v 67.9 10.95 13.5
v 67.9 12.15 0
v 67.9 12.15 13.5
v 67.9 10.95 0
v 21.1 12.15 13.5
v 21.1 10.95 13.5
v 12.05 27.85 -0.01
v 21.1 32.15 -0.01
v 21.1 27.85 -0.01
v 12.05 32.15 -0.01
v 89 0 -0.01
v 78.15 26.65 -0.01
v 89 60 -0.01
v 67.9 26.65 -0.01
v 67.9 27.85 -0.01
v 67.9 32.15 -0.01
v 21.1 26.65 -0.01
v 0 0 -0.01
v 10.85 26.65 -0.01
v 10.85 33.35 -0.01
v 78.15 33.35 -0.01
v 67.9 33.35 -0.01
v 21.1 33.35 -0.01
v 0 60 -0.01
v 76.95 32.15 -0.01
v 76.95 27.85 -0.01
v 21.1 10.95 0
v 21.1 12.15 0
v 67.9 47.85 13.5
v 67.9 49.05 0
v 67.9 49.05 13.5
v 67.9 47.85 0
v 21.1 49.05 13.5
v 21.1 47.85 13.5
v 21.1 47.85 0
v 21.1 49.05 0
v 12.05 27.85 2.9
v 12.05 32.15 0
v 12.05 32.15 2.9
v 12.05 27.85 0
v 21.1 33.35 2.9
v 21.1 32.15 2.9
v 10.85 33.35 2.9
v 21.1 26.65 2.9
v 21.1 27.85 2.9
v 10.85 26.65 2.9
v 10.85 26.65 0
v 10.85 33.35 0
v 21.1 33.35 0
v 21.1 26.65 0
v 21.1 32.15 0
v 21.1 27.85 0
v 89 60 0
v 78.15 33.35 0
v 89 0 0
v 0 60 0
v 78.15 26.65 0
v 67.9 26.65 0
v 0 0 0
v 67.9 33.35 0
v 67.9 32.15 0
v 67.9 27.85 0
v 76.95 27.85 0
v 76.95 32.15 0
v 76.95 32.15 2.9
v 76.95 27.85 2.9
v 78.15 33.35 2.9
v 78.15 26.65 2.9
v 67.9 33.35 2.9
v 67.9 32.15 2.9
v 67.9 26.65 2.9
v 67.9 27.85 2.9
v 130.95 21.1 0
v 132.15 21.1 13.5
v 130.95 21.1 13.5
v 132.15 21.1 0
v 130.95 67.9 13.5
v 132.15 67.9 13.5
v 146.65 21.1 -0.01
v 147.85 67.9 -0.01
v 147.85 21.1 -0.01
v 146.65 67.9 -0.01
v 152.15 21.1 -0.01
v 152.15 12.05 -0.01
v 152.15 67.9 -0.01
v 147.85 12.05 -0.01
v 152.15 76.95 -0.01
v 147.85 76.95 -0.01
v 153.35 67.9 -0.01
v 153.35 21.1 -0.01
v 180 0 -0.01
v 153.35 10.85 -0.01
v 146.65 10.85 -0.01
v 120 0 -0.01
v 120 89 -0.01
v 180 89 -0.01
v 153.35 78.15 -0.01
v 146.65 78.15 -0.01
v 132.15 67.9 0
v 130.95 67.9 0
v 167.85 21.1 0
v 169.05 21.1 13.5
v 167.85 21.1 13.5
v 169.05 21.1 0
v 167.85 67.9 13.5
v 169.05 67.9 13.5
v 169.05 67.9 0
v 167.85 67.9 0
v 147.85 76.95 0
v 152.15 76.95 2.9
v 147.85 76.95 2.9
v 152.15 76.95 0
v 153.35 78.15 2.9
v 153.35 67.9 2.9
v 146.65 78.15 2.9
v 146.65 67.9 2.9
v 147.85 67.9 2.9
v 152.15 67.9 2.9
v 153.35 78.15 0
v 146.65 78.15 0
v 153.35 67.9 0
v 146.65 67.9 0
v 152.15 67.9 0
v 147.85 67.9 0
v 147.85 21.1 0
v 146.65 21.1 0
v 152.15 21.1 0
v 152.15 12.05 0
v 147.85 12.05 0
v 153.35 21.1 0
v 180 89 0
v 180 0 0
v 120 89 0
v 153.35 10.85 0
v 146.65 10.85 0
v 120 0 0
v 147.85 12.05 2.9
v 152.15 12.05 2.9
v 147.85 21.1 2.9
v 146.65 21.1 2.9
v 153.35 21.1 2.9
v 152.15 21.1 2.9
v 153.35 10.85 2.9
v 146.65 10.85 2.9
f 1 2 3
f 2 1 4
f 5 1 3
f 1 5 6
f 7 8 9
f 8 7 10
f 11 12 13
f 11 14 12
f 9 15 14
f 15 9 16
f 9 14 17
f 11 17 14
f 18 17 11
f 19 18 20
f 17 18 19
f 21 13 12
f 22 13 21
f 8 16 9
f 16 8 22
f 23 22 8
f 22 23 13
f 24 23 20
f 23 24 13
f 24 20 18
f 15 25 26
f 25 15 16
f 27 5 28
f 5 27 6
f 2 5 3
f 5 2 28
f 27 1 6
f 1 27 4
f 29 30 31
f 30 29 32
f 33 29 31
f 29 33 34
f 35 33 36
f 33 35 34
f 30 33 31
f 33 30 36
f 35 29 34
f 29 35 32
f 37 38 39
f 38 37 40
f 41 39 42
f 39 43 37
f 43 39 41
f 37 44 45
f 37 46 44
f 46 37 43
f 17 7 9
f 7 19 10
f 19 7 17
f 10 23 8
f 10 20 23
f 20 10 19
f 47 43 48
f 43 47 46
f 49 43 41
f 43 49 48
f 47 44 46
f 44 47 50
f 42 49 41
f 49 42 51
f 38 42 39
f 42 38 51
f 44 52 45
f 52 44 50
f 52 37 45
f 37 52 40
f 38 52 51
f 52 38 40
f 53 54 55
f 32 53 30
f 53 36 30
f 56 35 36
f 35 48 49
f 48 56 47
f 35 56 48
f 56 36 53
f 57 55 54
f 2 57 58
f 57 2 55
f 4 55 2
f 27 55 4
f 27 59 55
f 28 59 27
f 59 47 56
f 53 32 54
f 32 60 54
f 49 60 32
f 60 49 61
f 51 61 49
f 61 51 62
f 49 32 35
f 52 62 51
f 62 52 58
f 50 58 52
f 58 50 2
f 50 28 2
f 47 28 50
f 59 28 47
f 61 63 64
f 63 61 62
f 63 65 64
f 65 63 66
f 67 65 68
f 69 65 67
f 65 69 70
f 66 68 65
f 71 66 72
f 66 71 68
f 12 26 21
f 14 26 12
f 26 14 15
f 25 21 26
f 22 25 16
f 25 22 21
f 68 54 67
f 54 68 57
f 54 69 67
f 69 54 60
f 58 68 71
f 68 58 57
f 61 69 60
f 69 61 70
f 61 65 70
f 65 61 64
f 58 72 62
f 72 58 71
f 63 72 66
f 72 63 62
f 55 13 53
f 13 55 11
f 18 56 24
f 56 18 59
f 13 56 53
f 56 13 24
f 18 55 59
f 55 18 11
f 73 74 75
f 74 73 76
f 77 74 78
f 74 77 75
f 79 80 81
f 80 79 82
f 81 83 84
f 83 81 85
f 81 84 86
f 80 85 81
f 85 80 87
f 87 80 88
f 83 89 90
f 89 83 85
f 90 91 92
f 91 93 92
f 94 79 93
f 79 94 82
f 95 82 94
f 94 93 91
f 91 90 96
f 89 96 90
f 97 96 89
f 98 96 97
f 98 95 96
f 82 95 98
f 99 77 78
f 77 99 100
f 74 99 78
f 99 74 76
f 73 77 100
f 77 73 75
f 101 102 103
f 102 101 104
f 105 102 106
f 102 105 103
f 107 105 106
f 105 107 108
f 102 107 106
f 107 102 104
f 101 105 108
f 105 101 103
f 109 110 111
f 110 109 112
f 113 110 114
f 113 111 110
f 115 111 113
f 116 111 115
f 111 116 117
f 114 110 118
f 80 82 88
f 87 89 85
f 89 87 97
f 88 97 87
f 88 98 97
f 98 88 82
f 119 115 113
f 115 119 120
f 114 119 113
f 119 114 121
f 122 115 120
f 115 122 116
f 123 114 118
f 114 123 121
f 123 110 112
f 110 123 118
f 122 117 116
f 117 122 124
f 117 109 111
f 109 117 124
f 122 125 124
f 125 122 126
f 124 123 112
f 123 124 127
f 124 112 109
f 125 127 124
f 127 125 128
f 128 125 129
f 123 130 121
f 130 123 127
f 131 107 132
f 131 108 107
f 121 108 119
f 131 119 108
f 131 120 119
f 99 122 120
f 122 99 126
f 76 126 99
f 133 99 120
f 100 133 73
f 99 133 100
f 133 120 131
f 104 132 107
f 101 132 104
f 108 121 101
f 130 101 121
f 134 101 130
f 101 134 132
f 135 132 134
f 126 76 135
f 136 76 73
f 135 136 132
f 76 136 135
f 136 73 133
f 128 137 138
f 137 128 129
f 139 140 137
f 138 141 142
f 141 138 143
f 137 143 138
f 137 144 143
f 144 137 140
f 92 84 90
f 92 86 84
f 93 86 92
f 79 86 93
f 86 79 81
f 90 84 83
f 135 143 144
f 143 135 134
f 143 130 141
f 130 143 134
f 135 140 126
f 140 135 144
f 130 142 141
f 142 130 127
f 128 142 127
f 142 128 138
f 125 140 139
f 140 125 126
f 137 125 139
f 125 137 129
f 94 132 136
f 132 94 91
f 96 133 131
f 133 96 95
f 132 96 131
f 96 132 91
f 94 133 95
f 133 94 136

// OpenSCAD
// file: ../../Base/Boxes.scad
// Fischertechnik Box Foundation
// Pre-designed Boxes

use <Constants.scad>

include <PlacementOptions.scad>

box190Width = 190;
box190Depth = 130;
box130Width = 130;
box130Depth = 95;
boxUsageHeight = 33.9;
boxWallThickness = 2.4;
boxBaseThickness = 1.0;

// getBoxWallThickness()
// Gets the wall thickness of a Fischertechnik Box

function getBoxWallThickness() = boxWallThickness;

// Gets the usable height of a fischertechnik box
function getBoxUsageHeight() = boxUsageHeight;

// Gets the thickness of the Fischertechnik box base.
function getBoxBaseThickness() = boxBaseThickness;

// Gets the usable inner space of a Box 190 as an x/y-list
function getBox190Space() = [
    box190Width - 2*getBoxWallThickness(), 
    box190Depth - 2*getBoxWallThickness() ];

// Imports the Fischertechnik empty box 130x190 mm and places it at position 0,0
// 190x130 are the outer sizes, the inner space is slightly smaller. Use getBox190Space() to get the inner sizes.
// This module needs the STL file "Fischertechnik Box 130x190.stl" in the library path.
// The box is positioned that the usable inner space is at the 0,0,0 position. The

module Box190() {
    translate([-getBoxWallThickness(),-getBoxWallThickness(),-getBoxBaseThickness()])
        import("Fischertechnik Box 130x190.stl", convexity=3);
}

// Gets the usable inner space of a Box 130 as an x/y-list
function getBox130Space() = [
    box130Width - 2*getBoxWallThickness(), 
    box130Depth - 2*getBoxWallThickness() ];

// Imports the Fischertechnik empty box 95x130 mm and places it at position 0,0
// 190x130 are the outer sizes, the inner space is slightly smaller. Use getBox190Space() to get the inner sizes.
// This module needs the STL file "Fischertechnik Box 95x130.stl" in the library path.
// The box is positioned that the usable inner space is at the 0,0,0 position. The

module Box130() {
    translate([-getBoxWallThickness(),-getBoxWallThickness(),-getBoxBaseThickness()])
        import("Fischertechnik Box 95x130.stl", convexity=3);
}

// Creates a web at the specified box walls
// corner 0 = LowerLeft, 1 = UpperLeft, 2 = UpperRight, 3 = LowerRight
// side 0 = LeftOfCorner, 1 = RightOfCorner
// distance = Distance in mm from the corner
// box = inner width and depth of the box (default: Box 190)
// webWidth = length of the web (default is 3 mms)
// webThickness = thickness of the web (default is 1 mm)

module BoxWeb(corner, side, distance, box=getBox190Space(), webWidth=3, webThickness=1.0) {
    sink = getBoxWallThickness()/2;

    width = (corner % 2 == 0) ? 
            (side == LeftOfCorner ? webWidth : webThickness) :
            (side == LeftOfCorner ? webThickness : webWidth);

    depth = (corner % 2 == 0) ? 
            (side == RightOfCorner ? webWidth : webThickness) :
            (side == RightOfCorner ? webThickness : webWidth);
    
    xDiff = corner == LowerLeft ? 
                (side == LeftOfCorner ? -sink : distance) :
            (corner == UpperLeft ?                
                (side == LeftOfCorner ? distance : -sink) :
            (corner == UpperRight ?
                (side == LeftOfCorner ? box.x-webWidth+sink : box.x-distance-webThickness) :
                (side == LeftOfCorner ? box.x-distance-webThickness: box.x-webWidth+sink)));

    yDiff = corner == LowerLeft ? 
                (side == RightOfCorner ? -sink : distance) :
            (corner == UpperLeft ?
                (side == RightOfCorner ? box.y-distance : box.y-webWidth+sink) :
            (corner == UpperRight ?
                (side == RightOfCorner ? box.y-webWidth+sink : box.y-distance) :
                (side == RightOfCorner ? distance : -sink)));
    
    translate([xDiff, yDiff, -getExcess()])
        cube([width, depth, boxUsageHeight + 2*getExcess()]);
}
// file: ../../Base/Rotation.scad
// Fischertechnik Box Foundation
// Geometry Helpers Rotation

include <PlacementOptions.scad>

// getRotatedSpace(space, rotation=NoRotation)
// Rotates the space dependent on the specified rotation

function getRotatedSpace(space, rotation=NoRotation) = [
    (rotation == Rotate90 || rotation == Rotate270) ? space.y : space.x,
    (rotation == Rotate90 || rotation == Rotate270) ? space.x : space.y
];

// Rotates the given space around the fixed left lower corner
// space = the space the children needs as width/depth list [width,depth]
// rotation = 0 Rotate0 degrees, 1 Rotate90 degrees, 2 Rotate180 degrees, 3 Rotate270 degrees (equivalent to -90)

module RotateFix(space, rotation=Rotate0) {
    dy = (rotation == Rotate0 || rotation == Rotate270) ? 0 :
        (rotation == Rotate90) ? space.x :
        space.y;
    dx = (rotation < Rotate180) ? 0 :
        (rotation == Rotate180) ? space.x :
        space.y;
    
    translate([dx, dy, 0])
        rotate([0, 0, rotations[rotation]])
            children();
}
// file: ../../Base/Alignment.scad
// Fischertechnik Box Foundation
// Geometry Helpers Alignment

include <PlacementOptions.scad>

// getAlignedX(elementWidth, spaceWidth, align=AlignRight, offset=0)
// Gets the aligned X offset of an element with the given
// width in the given space.
// elementWidth = The width of the element to positon
// spaceWidth = The space where the element should be aligned
// align = 0 AlignLeft, 1 AlignCenter, 2 AlignRight
// offset = an optional offset from the aligned position. When
// aligned left or centered, then positive values are in X direction.
// When aligned right then positive values are in negative X direction.

function getAlignedX(elementWidth, spaceWidth, align=AlignRight, offset=0) =
    (align == AlignLeft) ?
        offset :
        ((align == AlignCenter) ?
        (spaceWidth - elementWidth)/2 + offset :
        spaceWidth - offset - elementWidth);

// getAlignedY(elementDepth, spaceDepth, align=AlignTop, offset=0)
// Gets the aligned Y offset of an element with the given
// depth in the given space.
// elementDepth = The depth of the element to positon
// spaceDepth = The space where the element should be aligned
// align = 0 AlignBottom, 1 AlignCenter, 2 AlignTop
// offset = an optional offset from the aligned position. When
// aligned bottom or centered, then positive values are in Y direction.
// When aligned top then positive values are in negative Y direction.

function getAlignedY(elementDepth, spaceDepth, align=AlignTop, offset=0) =
    (align == AlignBottom) ?
        offset :
        ((align == AlignCenter) ?
        (spaceDepth - elementDepth)/2 + offset :
        spaceDepth - offset - elementDepth);
// file: ../../Base/Constants.scad
// Fischertechnik Box Foundation
// Constants

// Constant values necessary for multiple elements

// Base constants
dividerThickness = 1.2;
excess = 0.01;
fragments = 90;
tolerance = 0.8;

// Gets the thickness of a divider 
function getDividerThickness() = dividerThickness;

// Gets the excess that is used to merge walls into each other
function getExcess() = excess;

// Gets amount of fragments of a cylinder
function getFragments() = fragments;

// Gets the inner tolerance of a frame to each side
function getTolerance() = tolerance;


// Fischertechnik specific constants
axisDiameter = 4;
axisBottomDiameter = axisDiameter + 1;
standardEdgeDistance = 2.5;
standardWebDistance = 11.5;
standardCornerLength = 15;
tubeWallFactor = 1.6;

// Gets axis diameter
function getAxisDiameter() = axisDiameter;

// Gets axis bottom diameter for thicker part at the bottom
function getAxisBottomDiameter() = axisBottomDiameter;

// gets the standard distance to the wall of the box for dockable frames with webs
function getStandardEdgeDistance() = standardEdgeDistance;

// gets the standard distance of each web to the corner of the dockable frame
function getStandardWebDistance() = standardWebDistance;

// gets the standard length of the corner walls of a dockable frame
function getStandardCornerLength() = standardCornerLength;

// gets the wall thickness of a tube.
function getTubeWallThickness() = tubeWallFactor * getDividerThickness();
// file: ../../Base/PlacementOptions.scad
// Fischertechnik Box Foundation
// Placement Options

// Alignment
NoAlign = 0;
AlignLeft = 1;
AlignBottom = 2;
AlignCenter = 3;
AlignRight = 4;
AlignTop = 5;

// Element rotation degree steps
rotations = [0, -90, -180, -270];

// Rotation
NoRotation = 0;
Rotate0 = 0;
Rotate90 = 1;
Rotate180 = 2;
Rotate270 = 3;

// Docking (seen from above)
NoDock = -1;
DockLeft = 0;
DockTop = 1;
DockRight = 2;
DockCorner = 2;
DockBottom = 3;

// Web corners
LowerLeft = 0;
UpperLeft = 1;
UpperRight = 2;
LowerRight = 3;

// Web position relative to corner
LeftOfCorner = 0;
RightOfCorner = 1;
// file: ../../Elements/HolderCompleteBucket.scad
// Fischertechnik Box Library
// Complete Bucket Holder
// 37354, 37353, 37355, 38257

use <../Base/Constants.scad>
use <../ModelBase/Simple.scad>
use <../ModelBase/Complex.scad>

width = 89;
depth = 60;

// getHolderCompleteBucketSpace()
// Gets the space the holder complete bucket needs as width and depth (.x and .y as a list)

function getHolderCompleteBucketSpace() = [width, depth];

// HolderCompleteBucket()
// Holder for complete bucket with three middle and two side parts, 
// and a middle axis.
// 37354, 37353, 37355, 38257

module HolderCompleteBucket() {
    railWidth = 46.8;
    railHeight = 13.5;
    railDistance = 35.7;
    outerPinFrameLength = 10.25;
    innerPinFrameLength = outerPinFrameLength - 3*getDividerThickness();
    innerPinFrameDepth = 4.3;
    outerPinFrameDepth = innerPinFrameDepth + 2*getDividerThickness();
    pinFrameHeight = 2.9;
    
    Space(getHolderCompleteBucketSpace());

    railXOffset = (getHolderCompleteBucketSpace().x - railWidth) / 2;
    railYOffset1 = (getHolderCompleteBucketSpace().y - railDistance) / 2 - getDividerThickness();
    railYOffset2 = railYOffset1 + railDistance + getDividerThickness();    
    
    translate([railXOffset, 0, 0]) {
        translate([0, railYOffset1, 0])
            Wall([railWidth, getDividerThickness(), railHeight]);
        translate([0, railYOffset2, 0])
            Wall([railWidth, getDividerThickness(), railHeight]);
    }
    
    midYOffset = (getHolderCompleteBucketSpace().y - outerPinFrameDepth) / 2;
    
    railXOffset1 = railXOffset - outerPinFrameLength;
    translate([railXOffset1, midYOffset, 0])
        DockableFrame([innerPinFrameLength, innerPinFrameDepth, pinFrameHeight], wallRight=false, tolerance=0);
    
    railXOffset2 = outerPinFrameLength + railXOffset + railWidth;
    translate([railXOffset2, midYOffset, 0])
        mirror([1,0,0])
            DockableFrame([innerPinFrameLength, innerPinFrameDepth, pinFrameHeight], wallRight=false, tolerance=0);
}

// Test
color("lightgray")
HolderCompleteBucket();
// file: ../../Base/Deployment.scad
// Fischertechnik Box Foundation
// Geometry Helpers Deployment

use <Constants.scad>
use <Placement.scad>
use <Rotation.scad>

include <PlacementOptions.scad>

// getWidth(spaces, rotations, count, i=0)
// Gets the sum of the width of count specified spaces, including rotations for each space.
// spaces = List of spaces from which the width should be added. Used internally for DeployRow.
// rotations = specify rotations for each space to get its correct width
// count = The count of spaces from the specified spaces that should be included in the sum (for recursive call)
// i = The space index offset used to start to add (for recursive call)

function getWidth(spaces, rotations, count, i=0) = 
    (i < count) ? 
        getRotatedSpace(spaces[i], rotations[i]).x + getWidth(spaces, rotations, count, i+1) : 
        0;

// getX(spaces, rotations, distance, i)
// Calculates the X position of the space with the index i, when the spaces are placed with the given
// equal distances. Used internally for DeployRow.
// spaces = List of spaces from which the width should be added
// rotations = specify rotations for each space to get its correct width
// distance = Equal distance between each space
// i = Index of the space to get its X position for

function getX(spaces, rotations, distance, i) = 
    (i == 0) ? 
        0 :
        (getRotatedSpace(spaces[i-1], rotations[i-1]).x + distance + getX(spaces, rotations, distance, i-1));

// DeployRow(width, spaces, rotations)
// Deploys the elements in the specified width with equal distances.
// rowWidth = The width of the row in mm.
// spaces = The spaces of all elements to deploy.
// rotations = The rotations of each element: 0 Rotate0 0 degrees, 1 Rotate90 90 degrees, 
// 2 Rotate180 180 degrees, 3 Rotate270 270 degrees (equivalent to -90).

module DeployRow(rowWidth, spaces, rotations) {
    distance = (rowWidth - getWidth(spaces, rotations, len(spaces))) / (len(spaces)-1);
    
    for (i = [0:1:$children-1]) {
        x = getX(spaces, rotations, distance, i);
        translate([x, 0])
            RotateFix(spaces[i], rotations[i])
                children(i);
    }
}

// DeploySame(space, elementSpace, columns=2, rows=1, rotation=Rotate0)
// Deploys columns and rows of the specified child in the specified space with
// equal distances
// space = The space where the element copies are deployed
// elementSpace = The space the child needs
// columns = Count of elements per row
// rows = Count of rows deployed
// rotation = The rotation of the child that will be applied

module DeploySame(space, elementSpace, columns=2, rows=1, rotation=Rotate0) {
    
    elementWidth = getRotatedSpace(elementSpace, rotation).x;
    columnDistance = (space.x - columns * elementWidth) / (columns > 1 ? columns - 1 : 1);
    endColumnOffset = space.x - elementWidth;
    columnOffsetStep = elementWidth + columnDistance;
    
    elementDepth = getRotatedSpace(elementSpace, rotation).y;
    rowDistance = (space.y - rows * elementDepth) / (rows > 1 ? rows - 1 : 1);
    endRowOffset = space.y - elementDepth;
    rowOffsetStep = elementDepth + rowDistance;
    
    for (rowOffset = [0:rowOffsetStep:endRowOffset]) {
        for (columnOffset = [0:columnOffsetStep:endColumnOffset]) {
            translate([columnOffset, rowOffset])
                RotateFix(elementSpace, rotation)
                    children(0);
        }
    }
}

// getMergedRowWidth(spaces, rotations, count, i=0)
// Gets the width of the merged spaces with the specified rotations.
// Merging works all elements with two frame walls. 
// The right and left walls are merged into one single wall.
// spaces = List of spaces from which the width should be added.
// rotations = specify rotations for each space to get its correct width
// count = The count of spaces from the specified spaces that should be included in the sum (for recursive call)
// i = The space index offset used to start to add (for recursive call)

function getMergedRowWidth(spaces, rotations, count, i=0) =
    (i < count) ? 
        getRotatedSpace(spaces[i], rotations[i]).x + getWidth(spaces, rotations, count, i+1) - (i > 0 ? getDividerThickness() : 0) : 
        0;

// MergeRow(spaces, rotations, dividerThickness=0.8)
// Deploys the children so that all walls of the neighbors are merged in a single common wall.
// spaces = List of spaces of the children to get the sizes from.
// rotations = specify rotations for each space to get its correct width
// dividerThickness = Thickness of all dividers of the elements (default is 0.8)

module MergeRow(spaces, rotations, dividerThickness = getDividerThickness()) {
    for (i = [0:1:$children-1]) {
        x = getX(spaces, rotations, -getDividerThickness(), i);
        translate([x, 0, 0])
            RotateFix(spaces[i], rotations[i])
                children(i);
    }
}

// Merge(count, space, rotation, dividerThickness=0.8)
// Deploys the child count times so that all walls of the neighbors are merged in a single common wall.
// space = Space of the child to get the sizes from.
// rotation = rotation of the child to get the correct width
// dividerThickness = Thickness of all dividers of the element (default is 0.8)

module Merge(count, space, rotation, dividerThickness = getDividerThickness()) {
    x = getRotatedSpace(space, rotation).x - getDividerThickness();
    for (offset = [0:x:(count-1)*x]) {
        echo(offset);
        translate([offset, 0, 0])
            RotateFix(space, rotation)
                children(0);
    }
}
// file: ../../Base/Placement.scad
// Fischertechnik Box Foundation
// Geometry Helpers Placement

use <Constants.scad>
use <Alignment.scad>
use <Rotation.scad>
use <Boxes.scad>

include <PlacementOptions.scad>

// Place(x=0, y=0, elementSpace=[0,0], alignX=AlignLeft, alignY=AlignBottom, rotation=Rotate0, boxSpace=getBox190Space())
// Places the child at the specified position
// y = Y-Position. This is a relative position when an X aligment is specified.
// x = X-Position. This is a relative position when an Y aligment is specified.
// elementSpace = space of the element to be placed [x,y]
// alignX = -1=NoAlign, 0 AlignLeft, 1 AlignCenter, 3 AlignRight (elementSpace and boxSpace required!)
// alignY = -1=NoAlign, 2 AlignBottom, 1 AlignCenter, 4 AlignTop (elementSpace and boxSpace required!)
// rotation = 0 Rotate0 0 degrees, 1 Rotate90 90 degrees, 
// 2 Rotate180 180 degrees, 3 Rotate270 270 degrees (equivalent to -90)
// boxSpace = Inner space of the box where the placement occurs [x,y] - default is Box 190x130 inner space

module Place(x=0, y=0, elementSpace=[0,0], 
  alignX=AlignLeft, alignY=AlignBottom, 
  rotation=NoRotation, boxSpace=getBox190Space()) {

    module Position(x, y, space, rotation=Rotate0) {
        translate([x, y, 0])
            RotateFix(space, rotation)
                children(0);
    }

    space = getRotatedSpace(elementSpace, rotation);
    alignedX = getAlignedX(space.x, boxSpace.x, alignX, x);
    alignedY = getAlignedY(space.y, boxSpace.y, alignY, y);
    Position(alignedX, alignedY, elementSpace, rotation)
        children(0);
}

// Center(space=getBox130Space(), elementSpace=[0,0])
// space = Space where the children is centered. For cylinder use centered=true and no elementSpace.
// elementSpace = space of the element to be centered [x,y]

module Center(space=getBox190Space(), elementSpace=[0,0]) {
    translate([(space.x - elementSpace.x) / 2, (space.y - elementSpace.y) / 2])
        children(0);
}

// CenterHorizontal(width=0, y=0, offset=0, space=getBox130Space())
// space = Space where the children is centered. For cylinder use centered=true and no elementSpace.
// elementSpace = space of the element to be centered [x,y]

module CenterHorizontal(width=0, y=0, offset=0, space=getBox190Space()) {
    translate([(space.x - width) / 2 + offset, y])
        children(0);
}

// CenterVertical(depth=0, x=0, offset=0, space=getBox130Space())
// space = Space where the children is centered. For cylinder use centered=true and no elementSpace.
// elementSpace = space of the element to be centered [x,y]

module CenterVerticalal(depth=0, x=0, offset=0, space=getBox190Space()) {
    translate([x, (space.y - depth) / 2 + offset])
        children(0);
}
// main file
// Fischertechnik Box Foundation
// Elements
// Test HolderCompleteBucket

use <../../Base/Placement.scad>
use <../../Base/Deployment.scad>
use <../../Elements/HolderCompleteBucket.scad>

include <../../Base/PlacementOptions.scad>

HolderCompleteBucket();

Place(120, 0, elementSpace=getHolderCompleteBucketSpace(), rotation=Rotate90)
    HolderCompleteBucket();
